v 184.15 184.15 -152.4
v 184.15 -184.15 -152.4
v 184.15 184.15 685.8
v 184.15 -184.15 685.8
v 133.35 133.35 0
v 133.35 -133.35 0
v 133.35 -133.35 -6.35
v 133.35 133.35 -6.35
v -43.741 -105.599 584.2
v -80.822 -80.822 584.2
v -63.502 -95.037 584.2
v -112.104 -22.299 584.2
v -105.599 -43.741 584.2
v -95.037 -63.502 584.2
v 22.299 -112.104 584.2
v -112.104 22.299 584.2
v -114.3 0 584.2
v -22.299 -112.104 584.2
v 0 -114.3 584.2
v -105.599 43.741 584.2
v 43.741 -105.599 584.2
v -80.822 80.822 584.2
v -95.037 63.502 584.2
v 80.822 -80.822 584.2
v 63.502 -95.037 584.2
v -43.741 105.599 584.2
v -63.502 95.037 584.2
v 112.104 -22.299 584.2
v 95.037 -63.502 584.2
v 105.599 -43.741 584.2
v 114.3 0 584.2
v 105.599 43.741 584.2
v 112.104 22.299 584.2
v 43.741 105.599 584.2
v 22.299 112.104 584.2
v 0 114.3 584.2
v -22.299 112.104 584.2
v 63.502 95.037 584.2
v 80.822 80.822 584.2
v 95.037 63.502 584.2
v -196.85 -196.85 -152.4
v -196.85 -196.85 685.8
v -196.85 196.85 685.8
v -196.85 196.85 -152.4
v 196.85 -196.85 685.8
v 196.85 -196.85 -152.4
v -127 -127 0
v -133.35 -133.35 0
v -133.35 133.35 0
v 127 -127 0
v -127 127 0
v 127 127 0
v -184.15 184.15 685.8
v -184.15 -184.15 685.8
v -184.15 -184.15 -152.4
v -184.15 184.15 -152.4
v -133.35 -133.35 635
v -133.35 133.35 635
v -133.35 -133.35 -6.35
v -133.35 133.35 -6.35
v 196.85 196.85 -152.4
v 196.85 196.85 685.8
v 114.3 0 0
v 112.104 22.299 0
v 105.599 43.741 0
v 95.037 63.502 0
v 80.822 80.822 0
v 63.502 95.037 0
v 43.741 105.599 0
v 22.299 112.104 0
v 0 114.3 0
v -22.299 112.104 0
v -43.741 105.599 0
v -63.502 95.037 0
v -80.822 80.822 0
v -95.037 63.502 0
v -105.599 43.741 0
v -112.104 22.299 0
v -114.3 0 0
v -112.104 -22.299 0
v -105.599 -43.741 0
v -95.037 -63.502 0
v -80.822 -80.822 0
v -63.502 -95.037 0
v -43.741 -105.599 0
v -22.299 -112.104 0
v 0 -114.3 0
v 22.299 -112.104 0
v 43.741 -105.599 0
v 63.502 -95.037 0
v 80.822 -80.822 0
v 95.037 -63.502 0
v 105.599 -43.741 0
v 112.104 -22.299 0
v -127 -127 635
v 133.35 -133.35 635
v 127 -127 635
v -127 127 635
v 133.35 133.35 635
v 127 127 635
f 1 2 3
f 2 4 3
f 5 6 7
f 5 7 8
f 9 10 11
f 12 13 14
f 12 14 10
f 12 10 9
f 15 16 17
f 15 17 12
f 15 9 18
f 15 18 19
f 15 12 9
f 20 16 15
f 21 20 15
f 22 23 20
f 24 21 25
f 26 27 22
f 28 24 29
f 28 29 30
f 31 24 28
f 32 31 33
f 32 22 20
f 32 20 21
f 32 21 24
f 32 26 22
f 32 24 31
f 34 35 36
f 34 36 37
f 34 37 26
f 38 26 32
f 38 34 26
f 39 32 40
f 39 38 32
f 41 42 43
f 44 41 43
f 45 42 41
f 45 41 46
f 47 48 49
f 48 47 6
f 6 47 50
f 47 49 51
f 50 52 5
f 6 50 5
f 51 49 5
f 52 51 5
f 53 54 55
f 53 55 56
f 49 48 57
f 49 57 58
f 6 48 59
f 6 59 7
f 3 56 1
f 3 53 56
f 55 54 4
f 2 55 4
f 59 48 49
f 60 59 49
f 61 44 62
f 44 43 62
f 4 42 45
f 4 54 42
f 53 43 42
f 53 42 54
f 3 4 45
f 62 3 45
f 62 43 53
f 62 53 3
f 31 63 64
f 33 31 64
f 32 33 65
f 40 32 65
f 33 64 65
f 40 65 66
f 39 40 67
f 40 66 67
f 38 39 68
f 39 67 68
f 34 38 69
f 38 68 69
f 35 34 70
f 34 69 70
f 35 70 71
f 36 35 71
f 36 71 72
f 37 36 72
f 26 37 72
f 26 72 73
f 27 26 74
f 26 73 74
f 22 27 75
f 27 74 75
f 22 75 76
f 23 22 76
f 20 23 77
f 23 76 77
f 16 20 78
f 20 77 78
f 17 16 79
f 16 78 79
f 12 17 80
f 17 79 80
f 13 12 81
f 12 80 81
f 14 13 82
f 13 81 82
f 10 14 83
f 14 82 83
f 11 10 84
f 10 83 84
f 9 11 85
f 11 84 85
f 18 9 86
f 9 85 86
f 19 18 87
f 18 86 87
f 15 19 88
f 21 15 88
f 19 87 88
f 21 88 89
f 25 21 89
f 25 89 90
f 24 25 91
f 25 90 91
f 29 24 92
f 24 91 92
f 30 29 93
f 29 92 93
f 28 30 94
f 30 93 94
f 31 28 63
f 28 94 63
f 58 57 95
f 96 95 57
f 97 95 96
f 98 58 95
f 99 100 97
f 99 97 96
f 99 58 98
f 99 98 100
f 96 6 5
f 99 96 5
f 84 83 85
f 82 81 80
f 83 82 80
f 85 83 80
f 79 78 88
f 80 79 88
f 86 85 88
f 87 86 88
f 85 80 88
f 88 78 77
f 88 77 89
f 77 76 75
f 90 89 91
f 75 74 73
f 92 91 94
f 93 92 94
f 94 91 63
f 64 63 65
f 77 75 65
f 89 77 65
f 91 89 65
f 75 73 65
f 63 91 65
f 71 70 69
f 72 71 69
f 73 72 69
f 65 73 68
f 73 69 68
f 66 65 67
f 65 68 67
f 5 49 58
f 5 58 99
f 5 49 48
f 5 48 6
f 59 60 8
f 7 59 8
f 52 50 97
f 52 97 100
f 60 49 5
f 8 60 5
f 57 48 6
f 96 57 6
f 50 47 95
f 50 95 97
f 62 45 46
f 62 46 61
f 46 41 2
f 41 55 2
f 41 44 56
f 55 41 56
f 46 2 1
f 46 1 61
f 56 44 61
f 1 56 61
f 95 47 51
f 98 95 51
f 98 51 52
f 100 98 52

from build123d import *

# Parameters (mm, degrees)
F0_R          = 114.3
F1_DEPTH      = 584.2
F0_W          = 266.7
F0_H          = 266.7
F0_W_2        = 254
F0_H_2        = 254
F2_DEPTH      = 635
F3_DEPTH      = 6.35
F0_W_3        = 393.7
F0_H_3        = 393.7
F0_W_4        = 368.3
F0_H_4        = 368.3
F4_DEPTH      = 685.8
F4_DEPTH_BACK = 152.4


with BuildPart() as f1:
    # F0 (on Top) → F1 (new body)
    with BuildSketch(Plane.XY):
        Circle(F0_R)
    extrude(amount=F1_DEPTH)


with BuildPart() as f2:
    # F0 (on Top) → F2 (new body)
    with BuildSketch(Plane.XY):
        Rectangle(F0_W, F0_H)
        Rectangle(F0_W_2, F0_H_2, mode=Mode.SUBTRACT)
    extrude(amount=F2_DEPTH)


with BuildPart() as f3:
    # F0 (on Top) → F3 (new body)
    with BuildSketch(Plane.XY):
        Rectangle(F0_W, F0_H)
        Rectangle(F0_W_2, F0_H_2, mode=Mode.SUBTRACT)
        Rectangle(F0_W_2, F0_H_2)
        Circle(F0_R, mode=Mode.SUBTRACT)
        Circle(F0_R)
    extrude(amount=-F3_DEPTH)


with BuildPart() as f4:
    # F0 (on Top) → F4 (new body, two sides)
    with BuildSketch(Plane.XY) as f4_sk:
        Rectangle(F0_W_3, F0_H_3)
        Rectangle(F0_W_4, F0_H_4, mode=Mode.SUBTRACT)
    extrude(amount=F4_DEPTH)
    extrude(f4_sk.sketch, amount=-F4_DEPTH_BACK)


solid = Compound([f1.part, f2.part, f3.part, f4.part])
